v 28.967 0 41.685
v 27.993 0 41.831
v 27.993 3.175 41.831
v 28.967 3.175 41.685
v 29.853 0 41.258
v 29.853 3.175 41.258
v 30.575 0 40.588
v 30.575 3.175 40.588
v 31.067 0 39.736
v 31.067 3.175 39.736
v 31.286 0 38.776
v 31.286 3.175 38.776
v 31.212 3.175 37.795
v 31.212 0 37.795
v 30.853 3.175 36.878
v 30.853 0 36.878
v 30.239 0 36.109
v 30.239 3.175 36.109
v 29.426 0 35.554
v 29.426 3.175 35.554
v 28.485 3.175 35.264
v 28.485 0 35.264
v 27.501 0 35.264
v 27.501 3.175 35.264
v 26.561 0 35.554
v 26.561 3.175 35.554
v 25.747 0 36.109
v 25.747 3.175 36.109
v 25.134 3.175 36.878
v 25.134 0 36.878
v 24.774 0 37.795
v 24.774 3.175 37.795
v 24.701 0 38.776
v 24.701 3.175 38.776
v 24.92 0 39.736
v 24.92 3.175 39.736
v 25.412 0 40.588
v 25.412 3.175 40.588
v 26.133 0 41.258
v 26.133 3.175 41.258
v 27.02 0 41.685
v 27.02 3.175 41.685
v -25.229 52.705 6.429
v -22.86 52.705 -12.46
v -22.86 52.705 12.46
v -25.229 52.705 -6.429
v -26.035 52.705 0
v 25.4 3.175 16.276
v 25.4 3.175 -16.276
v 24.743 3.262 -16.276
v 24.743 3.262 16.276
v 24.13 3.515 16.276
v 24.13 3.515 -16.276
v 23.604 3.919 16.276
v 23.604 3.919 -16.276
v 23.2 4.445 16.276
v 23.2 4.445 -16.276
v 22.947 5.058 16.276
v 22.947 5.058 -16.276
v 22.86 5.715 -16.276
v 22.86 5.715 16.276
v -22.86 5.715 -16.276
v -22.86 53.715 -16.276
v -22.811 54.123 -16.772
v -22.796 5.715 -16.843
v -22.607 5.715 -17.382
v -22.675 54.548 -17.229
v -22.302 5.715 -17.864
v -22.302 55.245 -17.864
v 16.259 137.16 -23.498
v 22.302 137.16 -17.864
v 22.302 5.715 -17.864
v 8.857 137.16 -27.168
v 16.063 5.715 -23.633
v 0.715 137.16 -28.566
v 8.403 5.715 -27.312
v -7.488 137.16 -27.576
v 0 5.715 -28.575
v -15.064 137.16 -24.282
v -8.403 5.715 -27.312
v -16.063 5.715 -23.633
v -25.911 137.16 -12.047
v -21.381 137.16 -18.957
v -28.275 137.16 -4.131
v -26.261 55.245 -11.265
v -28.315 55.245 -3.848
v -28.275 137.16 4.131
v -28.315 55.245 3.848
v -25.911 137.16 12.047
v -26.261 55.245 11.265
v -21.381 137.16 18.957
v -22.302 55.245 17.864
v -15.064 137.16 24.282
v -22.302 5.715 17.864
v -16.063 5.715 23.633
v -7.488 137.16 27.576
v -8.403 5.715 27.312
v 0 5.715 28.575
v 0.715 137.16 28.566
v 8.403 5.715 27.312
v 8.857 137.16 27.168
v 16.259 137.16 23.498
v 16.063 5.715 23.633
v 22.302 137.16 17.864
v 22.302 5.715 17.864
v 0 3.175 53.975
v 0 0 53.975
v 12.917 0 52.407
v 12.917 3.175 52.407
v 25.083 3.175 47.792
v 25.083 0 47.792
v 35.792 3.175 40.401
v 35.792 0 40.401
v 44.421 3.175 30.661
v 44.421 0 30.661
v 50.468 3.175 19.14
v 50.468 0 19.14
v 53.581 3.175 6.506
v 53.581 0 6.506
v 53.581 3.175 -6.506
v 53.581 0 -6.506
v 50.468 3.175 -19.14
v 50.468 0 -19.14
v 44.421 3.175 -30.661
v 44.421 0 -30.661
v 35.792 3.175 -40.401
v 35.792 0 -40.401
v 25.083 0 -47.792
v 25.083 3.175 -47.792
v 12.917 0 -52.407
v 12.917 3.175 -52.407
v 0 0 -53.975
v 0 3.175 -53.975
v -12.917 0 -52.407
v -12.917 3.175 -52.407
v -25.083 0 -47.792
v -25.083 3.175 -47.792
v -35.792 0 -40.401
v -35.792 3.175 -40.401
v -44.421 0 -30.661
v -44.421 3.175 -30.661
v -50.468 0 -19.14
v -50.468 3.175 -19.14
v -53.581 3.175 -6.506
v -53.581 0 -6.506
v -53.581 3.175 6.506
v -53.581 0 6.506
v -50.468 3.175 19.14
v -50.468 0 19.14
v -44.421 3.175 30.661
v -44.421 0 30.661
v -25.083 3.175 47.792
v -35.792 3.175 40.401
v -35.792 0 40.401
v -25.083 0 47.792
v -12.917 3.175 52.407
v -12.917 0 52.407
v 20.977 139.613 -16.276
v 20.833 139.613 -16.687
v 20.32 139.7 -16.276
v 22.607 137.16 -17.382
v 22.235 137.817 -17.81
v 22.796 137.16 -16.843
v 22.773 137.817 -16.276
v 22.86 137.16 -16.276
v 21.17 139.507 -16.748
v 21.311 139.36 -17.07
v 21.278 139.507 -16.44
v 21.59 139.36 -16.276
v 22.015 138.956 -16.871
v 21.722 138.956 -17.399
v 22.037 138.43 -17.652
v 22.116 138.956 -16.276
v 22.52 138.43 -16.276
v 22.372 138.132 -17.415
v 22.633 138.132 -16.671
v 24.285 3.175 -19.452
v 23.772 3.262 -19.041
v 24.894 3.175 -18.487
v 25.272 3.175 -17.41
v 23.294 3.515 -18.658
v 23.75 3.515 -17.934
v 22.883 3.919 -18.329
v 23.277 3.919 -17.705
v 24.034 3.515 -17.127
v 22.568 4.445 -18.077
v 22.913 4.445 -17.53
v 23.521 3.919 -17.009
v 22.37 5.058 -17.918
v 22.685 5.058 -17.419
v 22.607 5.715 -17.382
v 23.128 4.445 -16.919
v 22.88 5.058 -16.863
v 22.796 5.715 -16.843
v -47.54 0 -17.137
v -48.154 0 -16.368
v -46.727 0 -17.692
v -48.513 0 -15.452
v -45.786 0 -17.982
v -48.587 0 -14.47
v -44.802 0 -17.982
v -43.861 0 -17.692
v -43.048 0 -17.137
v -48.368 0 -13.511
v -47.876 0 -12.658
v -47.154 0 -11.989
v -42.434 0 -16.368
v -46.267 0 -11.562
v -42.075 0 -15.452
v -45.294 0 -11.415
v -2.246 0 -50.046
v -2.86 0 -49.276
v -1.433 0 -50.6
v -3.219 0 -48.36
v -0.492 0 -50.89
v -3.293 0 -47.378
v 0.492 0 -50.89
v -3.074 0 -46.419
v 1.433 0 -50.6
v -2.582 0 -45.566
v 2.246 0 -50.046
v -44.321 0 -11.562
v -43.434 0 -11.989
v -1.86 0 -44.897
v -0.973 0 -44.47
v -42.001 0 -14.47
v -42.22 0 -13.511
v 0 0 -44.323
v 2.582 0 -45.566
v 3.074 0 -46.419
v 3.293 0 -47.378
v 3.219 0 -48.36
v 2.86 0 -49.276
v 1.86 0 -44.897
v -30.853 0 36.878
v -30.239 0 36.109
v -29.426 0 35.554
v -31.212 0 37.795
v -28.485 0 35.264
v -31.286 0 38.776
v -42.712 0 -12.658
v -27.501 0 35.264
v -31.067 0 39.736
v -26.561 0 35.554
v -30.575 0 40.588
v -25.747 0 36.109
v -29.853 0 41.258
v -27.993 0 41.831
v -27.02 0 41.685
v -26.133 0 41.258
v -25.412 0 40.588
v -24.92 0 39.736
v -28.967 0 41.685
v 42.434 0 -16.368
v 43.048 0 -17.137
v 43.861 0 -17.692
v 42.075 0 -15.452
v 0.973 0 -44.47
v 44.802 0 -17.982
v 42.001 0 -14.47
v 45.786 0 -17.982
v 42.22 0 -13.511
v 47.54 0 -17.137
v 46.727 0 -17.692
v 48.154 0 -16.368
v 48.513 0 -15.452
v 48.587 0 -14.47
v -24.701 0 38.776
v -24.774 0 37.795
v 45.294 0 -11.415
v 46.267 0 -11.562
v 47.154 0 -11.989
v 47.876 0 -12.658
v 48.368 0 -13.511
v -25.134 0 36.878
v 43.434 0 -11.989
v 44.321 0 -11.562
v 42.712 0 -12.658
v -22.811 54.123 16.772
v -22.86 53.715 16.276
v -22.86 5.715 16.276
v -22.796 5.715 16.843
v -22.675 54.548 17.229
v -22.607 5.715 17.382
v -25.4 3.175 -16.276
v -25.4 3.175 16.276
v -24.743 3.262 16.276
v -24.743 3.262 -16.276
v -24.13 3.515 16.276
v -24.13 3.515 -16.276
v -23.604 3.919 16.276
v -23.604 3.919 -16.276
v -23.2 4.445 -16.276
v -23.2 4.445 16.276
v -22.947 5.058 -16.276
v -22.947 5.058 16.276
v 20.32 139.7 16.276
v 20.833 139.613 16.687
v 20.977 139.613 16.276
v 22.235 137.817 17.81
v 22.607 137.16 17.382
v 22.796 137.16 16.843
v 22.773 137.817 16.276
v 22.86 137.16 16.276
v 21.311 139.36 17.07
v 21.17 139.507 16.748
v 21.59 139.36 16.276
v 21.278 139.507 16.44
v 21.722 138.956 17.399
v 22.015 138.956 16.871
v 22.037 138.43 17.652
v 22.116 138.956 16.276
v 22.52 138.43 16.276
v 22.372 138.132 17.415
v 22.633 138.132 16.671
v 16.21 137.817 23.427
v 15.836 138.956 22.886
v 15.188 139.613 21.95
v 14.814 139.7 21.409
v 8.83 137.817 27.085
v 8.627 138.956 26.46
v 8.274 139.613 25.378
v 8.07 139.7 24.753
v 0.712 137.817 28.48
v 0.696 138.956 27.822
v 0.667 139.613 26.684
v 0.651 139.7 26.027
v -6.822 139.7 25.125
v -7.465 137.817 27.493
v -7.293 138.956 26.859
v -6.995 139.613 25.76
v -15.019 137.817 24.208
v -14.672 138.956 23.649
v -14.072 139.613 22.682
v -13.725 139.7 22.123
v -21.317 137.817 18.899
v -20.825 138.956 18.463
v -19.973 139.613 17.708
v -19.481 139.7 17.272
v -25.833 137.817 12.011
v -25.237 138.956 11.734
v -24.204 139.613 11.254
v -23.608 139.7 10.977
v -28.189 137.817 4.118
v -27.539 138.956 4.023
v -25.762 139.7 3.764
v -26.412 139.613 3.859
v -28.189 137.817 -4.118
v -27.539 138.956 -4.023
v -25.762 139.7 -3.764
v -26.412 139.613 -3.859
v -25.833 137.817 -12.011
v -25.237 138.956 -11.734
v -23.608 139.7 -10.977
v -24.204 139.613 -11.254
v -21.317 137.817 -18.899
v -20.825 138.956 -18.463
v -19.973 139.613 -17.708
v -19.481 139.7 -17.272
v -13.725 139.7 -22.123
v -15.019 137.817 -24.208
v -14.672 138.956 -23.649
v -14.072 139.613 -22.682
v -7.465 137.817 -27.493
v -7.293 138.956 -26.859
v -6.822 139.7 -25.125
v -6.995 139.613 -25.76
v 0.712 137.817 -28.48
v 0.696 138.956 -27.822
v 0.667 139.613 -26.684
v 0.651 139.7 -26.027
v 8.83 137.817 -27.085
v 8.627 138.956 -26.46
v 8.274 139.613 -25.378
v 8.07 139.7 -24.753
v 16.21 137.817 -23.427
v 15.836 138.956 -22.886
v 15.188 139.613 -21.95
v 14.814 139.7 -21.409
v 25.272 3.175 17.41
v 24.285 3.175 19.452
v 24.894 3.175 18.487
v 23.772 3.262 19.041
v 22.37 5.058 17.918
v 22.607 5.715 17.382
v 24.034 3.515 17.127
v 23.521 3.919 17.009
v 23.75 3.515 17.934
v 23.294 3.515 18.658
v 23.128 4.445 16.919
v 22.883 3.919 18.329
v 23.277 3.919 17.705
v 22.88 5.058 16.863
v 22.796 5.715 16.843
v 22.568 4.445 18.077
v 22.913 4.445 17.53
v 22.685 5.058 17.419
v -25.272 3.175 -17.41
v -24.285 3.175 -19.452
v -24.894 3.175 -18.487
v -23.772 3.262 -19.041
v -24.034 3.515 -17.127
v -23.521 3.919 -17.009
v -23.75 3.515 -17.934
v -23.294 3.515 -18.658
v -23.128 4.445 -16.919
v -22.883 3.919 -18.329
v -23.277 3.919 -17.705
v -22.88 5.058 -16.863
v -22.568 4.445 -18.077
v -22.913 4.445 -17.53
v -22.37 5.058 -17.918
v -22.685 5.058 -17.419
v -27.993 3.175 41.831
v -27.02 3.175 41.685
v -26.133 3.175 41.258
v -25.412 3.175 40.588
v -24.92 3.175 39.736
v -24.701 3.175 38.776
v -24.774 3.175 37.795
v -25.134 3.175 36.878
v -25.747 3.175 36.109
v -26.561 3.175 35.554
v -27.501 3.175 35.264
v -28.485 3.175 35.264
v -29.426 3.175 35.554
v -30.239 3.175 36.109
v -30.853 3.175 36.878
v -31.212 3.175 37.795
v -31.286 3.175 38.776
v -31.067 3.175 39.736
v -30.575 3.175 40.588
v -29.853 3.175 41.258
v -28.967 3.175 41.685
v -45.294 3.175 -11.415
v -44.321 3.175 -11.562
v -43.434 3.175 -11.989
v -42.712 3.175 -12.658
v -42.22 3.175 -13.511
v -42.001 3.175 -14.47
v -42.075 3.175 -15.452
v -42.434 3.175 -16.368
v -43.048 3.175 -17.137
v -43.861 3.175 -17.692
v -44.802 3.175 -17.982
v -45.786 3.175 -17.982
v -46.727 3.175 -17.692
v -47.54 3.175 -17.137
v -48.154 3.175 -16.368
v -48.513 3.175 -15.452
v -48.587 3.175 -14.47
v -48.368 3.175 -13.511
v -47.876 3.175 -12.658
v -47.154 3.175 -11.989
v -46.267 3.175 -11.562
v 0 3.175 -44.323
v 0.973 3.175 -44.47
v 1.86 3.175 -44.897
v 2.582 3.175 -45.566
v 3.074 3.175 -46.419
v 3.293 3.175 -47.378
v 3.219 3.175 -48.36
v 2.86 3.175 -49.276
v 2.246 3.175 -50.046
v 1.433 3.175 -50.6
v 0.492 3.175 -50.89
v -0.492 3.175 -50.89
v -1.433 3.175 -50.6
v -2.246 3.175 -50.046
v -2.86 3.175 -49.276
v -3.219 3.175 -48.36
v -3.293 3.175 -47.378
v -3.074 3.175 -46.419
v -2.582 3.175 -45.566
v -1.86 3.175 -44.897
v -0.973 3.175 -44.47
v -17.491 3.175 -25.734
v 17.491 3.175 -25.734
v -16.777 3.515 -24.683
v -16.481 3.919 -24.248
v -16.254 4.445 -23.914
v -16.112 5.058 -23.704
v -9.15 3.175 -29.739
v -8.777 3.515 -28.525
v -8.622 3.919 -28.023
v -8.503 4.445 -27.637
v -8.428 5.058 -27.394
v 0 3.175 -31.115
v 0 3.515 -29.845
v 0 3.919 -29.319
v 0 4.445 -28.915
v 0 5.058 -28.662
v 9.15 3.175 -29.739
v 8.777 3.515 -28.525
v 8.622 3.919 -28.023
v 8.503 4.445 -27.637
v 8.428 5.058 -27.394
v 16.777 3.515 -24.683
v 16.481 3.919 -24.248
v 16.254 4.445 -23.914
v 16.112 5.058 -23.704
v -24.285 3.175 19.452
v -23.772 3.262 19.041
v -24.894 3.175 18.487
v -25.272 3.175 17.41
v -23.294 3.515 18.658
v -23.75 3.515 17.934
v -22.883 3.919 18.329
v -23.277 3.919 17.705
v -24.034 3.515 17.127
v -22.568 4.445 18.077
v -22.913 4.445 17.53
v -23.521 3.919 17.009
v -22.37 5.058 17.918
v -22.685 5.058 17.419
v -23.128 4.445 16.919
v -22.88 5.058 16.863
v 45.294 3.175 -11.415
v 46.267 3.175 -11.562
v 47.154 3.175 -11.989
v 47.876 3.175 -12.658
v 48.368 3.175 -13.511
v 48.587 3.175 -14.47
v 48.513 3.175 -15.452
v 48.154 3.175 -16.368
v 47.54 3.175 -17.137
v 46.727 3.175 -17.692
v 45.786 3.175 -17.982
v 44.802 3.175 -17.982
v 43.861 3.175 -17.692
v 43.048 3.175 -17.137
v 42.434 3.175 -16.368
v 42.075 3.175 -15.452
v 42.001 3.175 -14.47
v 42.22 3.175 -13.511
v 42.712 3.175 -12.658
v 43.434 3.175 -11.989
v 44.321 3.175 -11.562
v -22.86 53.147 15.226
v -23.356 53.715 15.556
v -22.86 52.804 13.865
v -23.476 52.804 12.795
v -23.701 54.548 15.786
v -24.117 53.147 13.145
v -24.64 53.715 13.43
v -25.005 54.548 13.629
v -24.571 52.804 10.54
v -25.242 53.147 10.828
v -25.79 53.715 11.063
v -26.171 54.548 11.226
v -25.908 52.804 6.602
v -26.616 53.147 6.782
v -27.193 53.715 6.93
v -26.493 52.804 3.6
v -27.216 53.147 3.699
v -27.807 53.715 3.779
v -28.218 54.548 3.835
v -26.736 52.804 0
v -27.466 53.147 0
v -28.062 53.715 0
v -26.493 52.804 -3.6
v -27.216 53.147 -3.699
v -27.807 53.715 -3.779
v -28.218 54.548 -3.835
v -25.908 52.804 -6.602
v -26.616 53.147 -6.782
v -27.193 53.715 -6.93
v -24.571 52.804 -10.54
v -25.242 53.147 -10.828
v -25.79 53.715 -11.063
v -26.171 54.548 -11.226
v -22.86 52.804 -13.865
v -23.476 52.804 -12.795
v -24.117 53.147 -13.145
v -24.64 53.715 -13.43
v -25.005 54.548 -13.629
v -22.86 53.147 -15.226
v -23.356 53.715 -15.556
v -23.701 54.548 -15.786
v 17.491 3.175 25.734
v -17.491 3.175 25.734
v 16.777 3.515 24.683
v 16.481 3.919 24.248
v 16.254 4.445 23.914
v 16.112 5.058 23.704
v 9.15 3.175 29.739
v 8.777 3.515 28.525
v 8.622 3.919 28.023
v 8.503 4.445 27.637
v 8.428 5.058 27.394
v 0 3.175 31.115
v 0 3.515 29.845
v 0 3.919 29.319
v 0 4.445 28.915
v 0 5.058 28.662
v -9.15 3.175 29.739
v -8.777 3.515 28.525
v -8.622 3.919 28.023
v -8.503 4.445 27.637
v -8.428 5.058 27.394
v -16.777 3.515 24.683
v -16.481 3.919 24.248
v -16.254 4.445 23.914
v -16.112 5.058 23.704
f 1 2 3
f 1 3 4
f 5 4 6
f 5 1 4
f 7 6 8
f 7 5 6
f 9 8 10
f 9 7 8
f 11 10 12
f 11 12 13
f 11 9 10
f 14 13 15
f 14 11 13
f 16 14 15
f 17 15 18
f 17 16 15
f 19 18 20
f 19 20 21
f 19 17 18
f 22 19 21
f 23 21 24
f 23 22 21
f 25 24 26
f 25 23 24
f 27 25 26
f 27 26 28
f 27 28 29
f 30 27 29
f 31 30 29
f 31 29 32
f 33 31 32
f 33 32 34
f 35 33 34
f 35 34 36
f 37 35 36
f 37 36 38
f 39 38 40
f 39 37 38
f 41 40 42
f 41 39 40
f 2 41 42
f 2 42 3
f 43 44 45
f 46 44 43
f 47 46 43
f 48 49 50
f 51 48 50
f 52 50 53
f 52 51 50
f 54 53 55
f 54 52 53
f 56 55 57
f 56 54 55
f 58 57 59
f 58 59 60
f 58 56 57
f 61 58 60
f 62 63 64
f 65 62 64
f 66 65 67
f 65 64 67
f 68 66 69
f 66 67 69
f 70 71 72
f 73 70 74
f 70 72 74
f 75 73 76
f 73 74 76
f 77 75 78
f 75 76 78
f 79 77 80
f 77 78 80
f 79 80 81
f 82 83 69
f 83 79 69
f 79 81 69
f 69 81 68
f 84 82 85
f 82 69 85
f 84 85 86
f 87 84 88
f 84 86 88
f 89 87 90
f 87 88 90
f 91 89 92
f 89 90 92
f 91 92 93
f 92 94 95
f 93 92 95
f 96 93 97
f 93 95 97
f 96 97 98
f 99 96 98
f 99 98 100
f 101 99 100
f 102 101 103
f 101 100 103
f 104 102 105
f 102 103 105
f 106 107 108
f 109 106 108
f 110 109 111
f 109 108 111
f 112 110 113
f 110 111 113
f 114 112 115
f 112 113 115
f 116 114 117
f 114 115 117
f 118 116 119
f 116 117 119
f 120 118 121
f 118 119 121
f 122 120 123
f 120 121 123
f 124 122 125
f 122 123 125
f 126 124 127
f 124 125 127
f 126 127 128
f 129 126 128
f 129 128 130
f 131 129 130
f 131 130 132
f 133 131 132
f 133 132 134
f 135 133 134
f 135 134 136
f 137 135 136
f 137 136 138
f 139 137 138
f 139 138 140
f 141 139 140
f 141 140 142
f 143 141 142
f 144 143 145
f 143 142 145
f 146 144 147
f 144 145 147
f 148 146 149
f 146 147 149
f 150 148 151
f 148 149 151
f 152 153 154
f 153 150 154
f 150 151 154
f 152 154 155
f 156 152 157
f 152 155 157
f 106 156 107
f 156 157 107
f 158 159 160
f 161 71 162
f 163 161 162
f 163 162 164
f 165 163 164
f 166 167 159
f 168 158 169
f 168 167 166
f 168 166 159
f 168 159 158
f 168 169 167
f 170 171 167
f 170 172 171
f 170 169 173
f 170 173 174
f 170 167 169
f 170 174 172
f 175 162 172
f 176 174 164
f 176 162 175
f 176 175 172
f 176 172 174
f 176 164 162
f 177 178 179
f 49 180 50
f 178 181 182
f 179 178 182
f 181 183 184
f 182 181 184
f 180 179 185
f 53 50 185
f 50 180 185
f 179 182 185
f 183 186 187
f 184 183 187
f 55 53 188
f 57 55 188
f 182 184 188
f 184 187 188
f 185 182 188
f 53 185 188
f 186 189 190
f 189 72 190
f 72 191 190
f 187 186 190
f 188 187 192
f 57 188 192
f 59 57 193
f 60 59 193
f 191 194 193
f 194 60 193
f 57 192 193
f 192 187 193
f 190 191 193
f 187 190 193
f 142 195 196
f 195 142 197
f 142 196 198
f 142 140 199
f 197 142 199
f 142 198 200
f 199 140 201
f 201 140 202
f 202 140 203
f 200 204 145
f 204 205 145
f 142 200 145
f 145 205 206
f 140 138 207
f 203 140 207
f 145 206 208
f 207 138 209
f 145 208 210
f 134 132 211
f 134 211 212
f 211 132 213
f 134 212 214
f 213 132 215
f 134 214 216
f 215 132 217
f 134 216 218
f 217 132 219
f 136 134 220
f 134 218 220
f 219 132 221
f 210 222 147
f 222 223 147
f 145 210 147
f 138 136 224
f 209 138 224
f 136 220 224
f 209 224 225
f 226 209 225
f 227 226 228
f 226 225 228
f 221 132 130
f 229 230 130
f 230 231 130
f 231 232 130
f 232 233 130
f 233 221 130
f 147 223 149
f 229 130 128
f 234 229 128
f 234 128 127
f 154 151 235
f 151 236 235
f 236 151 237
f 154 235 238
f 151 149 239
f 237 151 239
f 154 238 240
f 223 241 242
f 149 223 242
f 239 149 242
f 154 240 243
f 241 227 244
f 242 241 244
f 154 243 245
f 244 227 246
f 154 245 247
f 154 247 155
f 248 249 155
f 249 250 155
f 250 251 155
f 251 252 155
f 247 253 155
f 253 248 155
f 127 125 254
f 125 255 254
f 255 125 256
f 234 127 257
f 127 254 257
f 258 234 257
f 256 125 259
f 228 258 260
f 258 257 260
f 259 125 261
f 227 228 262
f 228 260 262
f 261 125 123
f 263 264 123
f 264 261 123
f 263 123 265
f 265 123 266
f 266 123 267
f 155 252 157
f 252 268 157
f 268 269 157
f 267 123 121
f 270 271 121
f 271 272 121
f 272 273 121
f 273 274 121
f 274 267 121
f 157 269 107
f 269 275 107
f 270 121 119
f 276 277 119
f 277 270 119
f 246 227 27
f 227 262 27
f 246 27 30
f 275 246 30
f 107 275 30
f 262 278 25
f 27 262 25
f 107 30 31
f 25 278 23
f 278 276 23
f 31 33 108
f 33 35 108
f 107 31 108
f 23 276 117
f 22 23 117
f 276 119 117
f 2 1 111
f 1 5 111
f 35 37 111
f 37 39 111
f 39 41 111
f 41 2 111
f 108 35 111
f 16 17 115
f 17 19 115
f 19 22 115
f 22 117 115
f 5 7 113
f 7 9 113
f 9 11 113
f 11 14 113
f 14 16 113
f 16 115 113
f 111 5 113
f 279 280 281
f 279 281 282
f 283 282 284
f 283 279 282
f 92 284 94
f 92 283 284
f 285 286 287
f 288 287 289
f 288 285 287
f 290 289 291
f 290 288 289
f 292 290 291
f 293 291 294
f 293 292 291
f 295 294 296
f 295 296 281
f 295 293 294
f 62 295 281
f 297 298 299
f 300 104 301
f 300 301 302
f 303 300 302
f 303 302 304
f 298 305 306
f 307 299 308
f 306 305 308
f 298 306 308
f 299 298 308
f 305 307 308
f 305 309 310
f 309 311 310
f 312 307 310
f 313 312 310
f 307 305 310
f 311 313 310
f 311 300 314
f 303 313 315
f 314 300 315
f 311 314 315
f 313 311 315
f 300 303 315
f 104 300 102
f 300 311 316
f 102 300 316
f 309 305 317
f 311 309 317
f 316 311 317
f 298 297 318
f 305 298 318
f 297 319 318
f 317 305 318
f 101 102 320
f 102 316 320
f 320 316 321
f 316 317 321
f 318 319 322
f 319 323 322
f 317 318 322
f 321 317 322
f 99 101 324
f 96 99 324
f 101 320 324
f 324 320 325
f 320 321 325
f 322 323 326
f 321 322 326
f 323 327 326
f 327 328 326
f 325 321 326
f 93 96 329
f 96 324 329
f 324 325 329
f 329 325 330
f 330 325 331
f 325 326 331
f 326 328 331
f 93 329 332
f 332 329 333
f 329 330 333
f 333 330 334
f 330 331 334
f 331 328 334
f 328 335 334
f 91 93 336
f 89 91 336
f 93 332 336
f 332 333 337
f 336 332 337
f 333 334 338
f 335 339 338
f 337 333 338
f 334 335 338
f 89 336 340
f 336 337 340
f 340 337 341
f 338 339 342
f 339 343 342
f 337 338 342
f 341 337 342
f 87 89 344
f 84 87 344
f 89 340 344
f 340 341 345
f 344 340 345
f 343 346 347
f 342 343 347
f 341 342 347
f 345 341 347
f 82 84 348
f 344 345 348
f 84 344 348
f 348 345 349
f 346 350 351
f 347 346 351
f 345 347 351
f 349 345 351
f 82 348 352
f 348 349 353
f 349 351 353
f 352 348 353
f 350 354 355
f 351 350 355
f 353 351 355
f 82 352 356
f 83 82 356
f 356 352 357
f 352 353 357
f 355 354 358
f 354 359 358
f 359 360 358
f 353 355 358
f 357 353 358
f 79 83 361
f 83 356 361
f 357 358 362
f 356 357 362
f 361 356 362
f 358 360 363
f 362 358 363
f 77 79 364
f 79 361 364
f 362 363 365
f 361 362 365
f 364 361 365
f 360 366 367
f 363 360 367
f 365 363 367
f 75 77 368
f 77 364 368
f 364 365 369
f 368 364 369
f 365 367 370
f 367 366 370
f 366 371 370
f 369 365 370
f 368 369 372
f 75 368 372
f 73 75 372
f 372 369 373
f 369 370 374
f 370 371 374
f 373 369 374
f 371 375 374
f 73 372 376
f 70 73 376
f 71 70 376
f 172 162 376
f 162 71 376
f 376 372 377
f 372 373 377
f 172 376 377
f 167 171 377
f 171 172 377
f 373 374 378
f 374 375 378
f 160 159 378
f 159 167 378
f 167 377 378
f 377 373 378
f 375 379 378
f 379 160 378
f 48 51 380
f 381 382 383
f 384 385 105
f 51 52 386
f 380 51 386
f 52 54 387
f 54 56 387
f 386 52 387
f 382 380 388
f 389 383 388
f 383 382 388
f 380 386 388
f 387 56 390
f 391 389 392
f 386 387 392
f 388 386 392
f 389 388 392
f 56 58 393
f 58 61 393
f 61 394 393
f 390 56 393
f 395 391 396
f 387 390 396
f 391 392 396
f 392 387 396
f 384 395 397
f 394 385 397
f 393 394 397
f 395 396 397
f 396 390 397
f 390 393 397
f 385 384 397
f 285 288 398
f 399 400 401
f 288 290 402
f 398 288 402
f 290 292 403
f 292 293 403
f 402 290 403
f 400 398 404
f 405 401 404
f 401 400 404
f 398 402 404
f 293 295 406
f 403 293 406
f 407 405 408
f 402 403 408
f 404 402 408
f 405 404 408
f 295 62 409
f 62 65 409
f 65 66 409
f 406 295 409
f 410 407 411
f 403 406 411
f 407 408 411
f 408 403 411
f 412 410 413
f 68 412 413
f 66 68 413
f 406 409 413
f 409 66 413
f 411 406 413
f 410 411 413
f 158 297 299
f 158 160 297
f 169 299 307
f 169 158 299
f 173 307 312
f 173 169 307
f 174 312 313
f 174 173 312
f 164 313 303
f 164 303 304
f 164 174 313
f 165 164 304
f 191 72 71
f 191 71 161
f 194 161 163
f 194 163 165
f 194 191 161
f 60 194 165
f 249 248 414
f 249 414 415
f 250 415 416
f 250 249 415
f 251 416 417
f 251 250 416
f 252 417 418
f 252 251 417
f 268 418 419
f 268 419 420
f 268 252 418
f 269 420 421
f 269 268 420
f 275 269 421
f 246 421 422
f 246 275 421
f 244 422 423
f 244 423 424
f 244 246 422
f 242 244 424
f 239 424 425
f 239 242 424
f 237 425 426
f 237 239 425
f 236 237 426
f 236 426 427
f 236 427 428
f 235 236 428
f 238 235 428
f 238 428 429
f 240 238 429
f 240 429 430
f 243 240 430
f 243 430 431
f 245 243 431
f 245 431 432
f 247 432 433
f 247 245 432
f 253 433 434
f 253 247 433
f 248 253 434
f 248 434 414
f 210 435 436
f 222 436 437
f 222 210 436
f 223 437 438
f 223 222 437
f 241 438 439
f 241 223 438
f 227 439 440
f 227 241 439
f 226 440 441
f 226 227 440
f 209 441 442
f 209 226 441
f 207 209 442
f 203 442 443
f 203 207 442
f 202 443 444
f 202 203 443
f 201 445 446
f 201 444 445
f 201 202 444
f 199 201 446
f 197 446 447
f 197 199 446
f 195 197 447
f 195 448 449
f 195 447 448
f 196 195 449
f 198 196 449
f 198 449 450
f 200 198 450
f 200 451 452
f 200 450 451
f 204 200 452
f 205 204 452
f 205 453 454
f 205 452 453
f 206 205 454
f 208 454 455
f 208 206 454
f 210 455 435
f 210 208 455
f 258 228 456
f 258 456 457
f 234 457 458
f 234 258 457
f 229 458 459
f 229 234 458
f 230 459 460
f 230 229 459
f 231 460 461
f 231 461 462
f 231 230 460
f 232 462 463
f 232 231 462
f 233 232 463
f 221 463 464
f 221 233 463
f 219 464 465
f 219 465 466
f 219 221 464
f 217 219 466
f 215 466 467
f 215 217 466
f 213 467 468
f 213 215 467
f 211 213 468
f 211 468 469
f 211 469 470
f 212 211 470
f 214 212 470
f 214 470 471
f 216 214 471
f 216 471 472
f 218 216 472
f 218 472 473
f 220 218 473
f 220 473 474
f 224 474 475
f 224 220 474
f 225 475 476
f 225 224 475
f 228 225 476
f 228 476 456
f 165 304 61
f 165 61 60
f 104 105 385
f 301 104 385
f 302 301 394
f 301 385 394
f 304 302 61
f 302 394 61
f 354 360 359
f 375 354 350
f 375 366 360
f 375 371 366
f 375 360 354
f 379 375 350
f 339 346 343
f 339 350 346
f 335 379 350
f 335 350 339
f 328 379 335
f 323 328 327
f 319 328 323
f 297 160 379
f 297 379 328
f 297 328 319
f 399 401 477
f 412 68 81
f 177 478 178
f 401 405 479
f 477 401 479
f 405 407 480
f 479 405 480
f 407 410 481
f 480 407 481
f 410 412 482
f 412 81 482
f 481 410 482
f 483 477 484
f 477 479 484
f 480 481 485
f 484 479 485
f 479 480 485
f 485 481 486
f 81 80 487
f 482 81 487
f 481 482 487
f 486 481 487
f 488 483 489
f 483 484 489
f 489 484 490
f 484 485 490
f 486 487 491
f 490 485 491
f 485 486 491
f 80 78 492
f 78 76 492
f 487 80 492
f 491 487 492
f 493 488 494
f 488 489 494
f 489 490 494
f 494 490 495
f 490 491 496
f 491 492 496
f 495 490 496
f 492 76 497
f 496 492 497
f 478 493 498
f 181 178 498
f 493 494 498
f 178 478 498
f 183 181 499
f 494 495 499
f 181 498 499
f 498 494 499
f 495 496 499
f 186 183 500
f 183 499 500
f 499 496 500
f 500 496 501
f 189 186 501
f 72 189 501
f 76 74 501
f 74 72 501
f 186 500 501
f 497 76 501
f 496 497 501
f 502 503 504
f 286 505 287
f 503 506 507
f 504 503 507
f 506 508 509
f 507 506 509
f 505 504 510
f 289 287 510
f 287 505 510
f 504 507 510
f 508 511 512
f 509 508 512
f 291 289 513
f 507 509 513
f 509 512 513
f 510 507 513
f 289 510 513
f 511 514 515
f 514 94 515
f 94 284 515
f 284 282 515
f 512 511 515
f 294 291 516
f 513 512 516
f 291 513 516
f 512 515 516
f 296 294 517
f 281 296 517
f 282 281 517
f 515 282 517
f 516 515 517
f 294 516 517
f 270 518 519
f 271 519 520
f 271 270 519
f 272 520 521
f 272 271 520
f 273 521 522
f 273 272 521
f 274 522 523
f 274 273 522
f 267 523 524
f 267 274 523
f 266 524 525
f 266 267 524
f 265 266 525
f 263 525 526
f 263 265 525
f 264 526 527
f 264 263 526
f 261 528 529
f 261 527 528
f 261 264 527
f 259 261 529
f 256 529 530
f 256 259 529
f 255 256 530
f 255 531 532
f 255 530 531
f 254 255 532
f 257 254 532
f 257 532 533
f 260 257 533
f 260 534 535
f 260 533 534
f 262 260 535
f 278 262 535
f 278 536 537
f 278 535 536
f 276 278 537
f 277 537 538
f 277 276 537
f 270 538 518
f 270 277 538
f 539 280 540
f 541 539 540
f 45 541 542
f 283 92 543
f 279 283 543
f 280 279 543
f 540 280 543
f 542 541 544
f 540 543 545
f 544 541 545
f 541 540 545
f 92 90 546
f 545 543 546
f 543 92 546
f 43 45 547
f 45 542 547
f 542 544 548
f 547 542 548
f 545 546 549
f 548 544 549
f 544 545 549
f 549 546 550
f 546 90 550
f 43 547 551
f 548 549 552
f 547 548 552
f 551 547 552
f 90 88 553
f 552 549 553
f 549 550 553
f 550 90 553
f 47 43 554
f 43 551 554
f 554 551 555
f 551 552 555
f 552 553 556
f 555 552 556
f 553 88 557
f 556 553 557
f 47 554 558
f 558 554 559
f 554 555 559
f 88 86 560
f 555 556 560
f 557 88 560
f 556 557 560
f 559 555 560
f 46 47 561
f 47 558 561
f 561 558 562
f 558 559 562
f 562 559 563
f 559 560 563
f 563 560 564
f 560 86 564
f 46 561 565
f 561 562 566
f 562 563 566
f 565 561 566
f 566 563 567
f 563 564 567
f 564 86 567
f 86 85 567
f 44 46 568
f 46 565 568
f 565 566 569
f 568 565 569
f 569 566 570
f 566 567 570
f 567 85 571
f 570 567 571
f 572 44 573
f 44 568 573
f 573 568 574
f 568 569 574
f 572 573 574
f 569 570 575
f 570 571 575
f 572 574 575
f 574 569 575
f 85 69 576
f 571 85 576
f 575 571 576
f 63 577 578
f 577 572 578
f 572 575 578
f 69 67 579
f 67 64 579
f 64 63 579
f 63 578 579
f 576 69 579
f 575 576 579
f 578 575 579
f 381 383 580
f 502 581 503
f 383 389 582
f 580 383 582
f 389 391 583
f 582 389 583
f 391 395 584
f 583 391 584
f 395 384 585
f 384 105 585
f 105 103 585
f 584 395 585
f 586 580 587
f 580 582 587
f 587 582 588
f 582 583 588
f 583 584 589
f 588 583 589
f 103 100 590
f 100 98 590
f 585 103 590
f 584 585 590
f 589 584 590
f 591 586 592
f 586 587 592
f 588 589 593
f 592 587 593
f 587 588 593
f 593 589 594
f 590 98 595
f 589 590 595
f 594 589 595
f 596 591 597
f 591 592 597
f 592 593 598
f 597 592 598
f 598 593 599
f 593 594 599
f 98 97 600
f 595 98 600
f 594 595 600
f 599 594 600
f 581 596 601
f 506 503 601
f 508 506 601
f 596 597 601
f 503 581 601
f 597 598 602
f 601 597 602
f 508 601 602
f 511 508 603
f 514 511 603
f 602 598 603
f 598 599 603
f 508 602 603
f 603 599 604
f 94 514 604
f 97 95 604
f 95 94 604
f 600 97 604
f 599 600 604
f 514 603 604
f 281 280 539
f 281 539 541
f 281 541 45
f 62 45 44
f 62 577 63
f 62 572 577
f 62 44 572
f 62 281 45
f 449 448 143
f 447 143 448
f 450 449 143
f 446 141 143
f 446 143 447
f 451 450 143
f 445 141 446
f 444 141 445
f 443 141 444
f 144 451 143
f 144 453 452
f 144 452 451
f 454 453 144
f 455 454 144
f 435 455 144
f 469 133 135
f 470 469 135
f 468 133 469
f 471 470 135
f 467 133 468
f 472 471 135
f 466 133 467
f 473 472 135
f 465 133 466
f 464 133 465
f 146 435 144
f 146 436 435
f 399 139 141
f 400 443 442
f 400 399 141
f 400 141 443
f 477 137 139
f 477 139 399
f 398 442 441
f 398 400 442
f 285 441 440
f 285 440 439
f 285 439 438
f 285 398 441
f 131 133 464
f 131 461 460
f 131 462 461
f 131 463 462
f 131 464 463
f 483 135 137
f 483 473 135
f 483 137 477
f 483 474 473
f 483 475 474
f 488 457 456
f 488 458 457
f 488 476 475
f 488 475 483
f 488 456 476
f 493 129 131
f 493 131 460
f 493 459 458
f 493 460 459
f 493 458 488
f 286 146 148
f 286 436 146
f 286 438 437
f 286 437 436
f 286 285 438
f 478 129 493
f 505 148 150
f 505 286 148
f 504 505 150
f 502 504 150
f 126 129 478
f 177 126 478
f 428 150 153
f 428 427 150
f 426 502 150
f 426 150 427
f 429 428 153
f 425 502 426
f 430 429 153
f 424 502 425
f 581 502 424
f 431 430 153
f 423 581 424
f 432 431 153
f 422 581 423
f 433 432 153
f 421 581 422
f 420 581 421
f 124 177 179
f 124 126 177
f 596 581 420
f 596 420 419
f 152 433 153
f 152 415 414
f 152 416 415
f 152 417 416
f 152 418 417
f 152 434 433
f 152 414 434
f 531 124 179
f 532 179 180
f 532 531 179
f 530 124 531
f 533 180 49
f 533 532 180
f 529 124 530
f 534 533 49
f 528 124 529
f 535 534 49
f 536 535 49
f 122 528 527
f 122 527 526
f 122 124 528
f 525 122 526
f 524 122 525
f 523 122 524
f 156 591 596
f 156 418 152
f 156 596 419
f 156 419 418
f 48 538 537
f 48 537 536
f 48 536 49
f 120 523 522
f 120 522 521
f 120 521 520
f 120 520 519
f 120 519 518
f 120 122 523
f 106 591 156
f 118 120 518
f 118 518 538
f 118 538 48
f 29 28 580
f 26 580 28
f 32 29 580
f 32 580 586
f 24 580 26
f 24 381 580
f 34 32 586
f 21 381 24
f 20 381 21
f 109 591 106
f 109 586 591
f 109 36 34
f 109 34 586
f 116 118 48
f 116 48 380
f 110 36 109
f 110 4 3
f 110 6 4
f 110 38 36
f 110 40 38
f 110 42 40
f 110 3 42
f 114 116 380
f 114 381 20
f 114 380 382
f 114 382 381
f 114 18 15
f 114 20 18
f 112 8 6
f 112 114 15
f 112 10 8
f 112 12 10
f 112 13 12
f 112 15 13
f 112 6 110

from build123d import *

# Parameters (mm, degrees)
SKETCH1_R           = 53.975
SKETCH1_R_2         = 3.302
BOSS_EXTRUDE1_DEPTH = 3.175
SKETCH2_R           = 28.575
BOSS_EXTRUDE2_DEPTH = 136.525
SKETCH3_W           = 40.450959828
SKETCH3_H           = 34.29
CUT_EXTRUDE1_DEPTH  = 136.525
SKETCH4_W           = 24.671855952
SKETCH4_H           = 34.29
CUT_EXTRUDE2_DEPTH  = 49.53
FILLET1_R           = 2.54


with BuildPart() as part:
    # Sketch1 → Boss-Extrude1 (new body)
    with BuildSketch(Plane(origin=(0, 0, 0), x_dir=(1, 0, 0), z_dir=(0, 1, 0))):
        with Locations(Location((0, 0, 0), (0, 0, 270))):
            Circle(SKETCH1_R)
        with Locations(Location((0, 47.625, 0), (0, 0, 270))):
            Circle(SKETCH1_R_2, mode=Mode.SUBTRACT)
        with Locations(Location((45.294066589, 14.716934357, 0), (0, 0, 270))):
            Circle(SKETCH1_R_2, mode=Mode.SUBTRACT)
        with Locations(Location((27.99327264, -38.529434357, 0), (0, 0, 270))):
            Circle(SKETCH1_R_2, mode=Mode.SUBTRACT)
        with Locations(Location((-27.99327264, -38.529434357, 0), (0, 0, 270))):
            Circle(SKETCH1_R_2, mode=Mode.SUBTRACT)
        with Locations(Location((-45.294066589, 14.716934357, 0), (0, 0, 270))):
            Circle(SKETCH1_R_2, mode=Mode.SUBTRACT)
    extrude(amount=BOSS_EXTRUDE1_DEPTH)

    # Sketch2 → Boss-Extrude2 (add)
    with BuildSketch(Plane(origin=(0, 3.175, 0), x_dir=(1, 0, 0), z_dir=(0, 1, 0))):
        with Locations(Location((0, 0, 0), (0, 0, 270))):
            Circle(SKETCH2_R)
    extrude(amount=BOSS_EXTRUDE2_DEPTH)

    # Sketch3 → Cut-Extrude1 (cut)
    with BuildSketch(Plane(origin=(0, 139.7, 0), x_dir=(1, 0, 0), z_dir=(0, 1, 0))):
        with Locations((43.085479914, 0)):
            Rectangle(SKETCH3_W, SKETCH3_H)
    extrude(amount=-CUT_EXTRUDE1_DEPTH, mode=Mode.SUBTRACT)

    # Sketch4 → Cut-Extrude2 (cut)
    with BuildSketch(Plane(origin=(0, 3.175, 0), x_dir=(1, 0, 0), z_dir=(0, 1, 0))):
        with Locations((-35.195927976, 0)):
            Rectangle(SKETCH4_W, SKETCH4_H)
    extrude(amount=CUT_EXTRUDE2_DEPTH, mode=Mode.SUBTRACT)

    # Fillet1
    fillet1_edges = [part.edges().sort_by_distance(p)[0] for p in [
        (-28.575, 139.7, 0),
        (22.86, 139.7, 0),
        (22.86, 71.4375, 17.145),
        (22.86, 71.4375, -17.145),
        (-28.575, 52.705, 0),
        (-22.86, 27.94, 17.145),
        (-22.86, 27.94, -17.145),
    ]]
    fillet(fillet1_edges, radius=FILLET1_R)
    fillet1_2_edges = [part.edges().sort_by_distance(p)[0] for p in [
        (0, 3.175, -28.575),
        (22.86, 3.175, 0),
        (0, 3.175, 28.575),
        (-22.86, 3.175, 0),
        (-22.716559526, 3.175, -17.117815364),
        (-22.716559526, 3.175, 17.117815364),
        (22.716559526, 3.175, 17.117815364),
        (22.716559526, 3.175, -17.117815364),
    ]]
    fillet(fillet1_2_edges, radius=FILLET1_R)


solid = part.part
